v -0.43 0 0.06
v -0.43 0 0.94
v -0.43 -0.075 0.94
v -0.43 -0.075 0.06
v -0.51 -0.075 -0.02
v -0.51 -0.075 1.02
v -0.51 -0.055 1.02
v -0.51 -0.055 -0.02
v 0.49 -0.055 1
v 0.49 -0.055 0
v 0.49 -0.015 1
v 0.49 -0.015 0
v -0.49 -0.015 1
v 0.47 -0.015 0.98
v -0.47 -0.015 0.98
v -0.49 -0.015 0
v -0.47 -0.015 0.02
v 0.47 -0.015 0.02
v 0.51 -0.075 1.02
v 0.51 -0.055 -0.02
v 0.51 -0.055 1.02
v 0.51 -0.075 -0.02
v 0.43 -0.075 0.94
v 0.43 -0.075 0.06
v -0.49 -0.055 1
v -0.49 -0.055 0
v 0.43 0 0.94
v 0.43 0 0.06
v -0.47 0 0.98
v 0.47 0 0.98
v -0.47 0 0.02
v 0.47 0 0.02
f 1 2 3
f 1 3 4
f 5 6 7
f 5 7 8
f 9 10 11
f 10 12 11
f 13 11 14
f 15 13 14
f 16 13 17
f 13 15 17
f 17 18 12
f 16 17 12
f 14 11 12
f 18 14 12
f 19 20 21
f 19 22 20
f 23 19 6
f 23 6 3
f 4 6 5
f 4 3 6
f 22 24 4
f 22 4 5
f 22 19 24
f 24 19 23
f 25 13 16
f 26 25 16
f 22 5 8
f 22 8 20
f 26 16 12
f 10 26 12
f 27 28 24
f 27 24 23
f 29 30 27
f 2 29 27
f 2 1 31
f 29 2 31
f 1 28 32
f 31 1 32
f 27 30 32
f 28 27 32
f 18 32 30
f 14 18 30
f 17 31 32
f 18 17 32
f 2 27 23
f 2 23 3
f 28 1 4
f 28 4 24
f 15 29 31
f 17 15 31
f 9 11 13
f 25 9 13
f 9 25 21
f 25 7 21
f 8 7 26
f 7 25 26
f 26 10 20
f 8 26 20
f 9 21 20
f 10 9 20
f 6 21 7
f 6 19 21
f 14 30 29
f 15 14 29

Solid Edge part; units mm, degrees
sketch "Sketch1" plane through (0, 0, 0) normal (0, -1, 0) x (1, 0, 0)
  line L0 (-0.49, 0) -> (0.49, 0)
  line L1 (0.49, 0) -> (0.49, 1)
  line L2 (0.49, 1) -> (-0.49, 1)
  line L3 (-0.49, 1) -> (-0.49, 0)
  dimension "D1" = 1
  dimension "D2" = 0.98
extrude "Protrusion1" add sketch "Sketch1" along normal blind 0.075
sketch "Sketch2" plane through (0, 0, 0.69) normal (0, 1, 0) x (-1, 0, 0)
  line L0 (-0.43, 0.25) -> (0.43, 0.25)
  line L1 (0.43, 0.25) -> (0.43, -0.63)
  line L2 (0.43, -0.63) -> (-0.43, -0.63)
  line L3 (-0.43, -0.63) -> (-0.43, 0.25)
extrude "Cutout1" cut sketch "Sketch2" against normal up to next
sketch "Sketch3" plane through (0, 0, 0.69) normal (0, 1, 0) x (-1, 0, 0)
  line L0 (-0.47, -0.67) -> (-0.47, 0.29)
  line L1 (-0.47, 0.29) -> (0.47, 0.29)
  line L2 (0.47, 0.29) -> (0.47, -0.67)
  line L3 (0.47, -0.67) -> (-0.47, -0.67)
  line L4 (-0.49, -0.69) -> (-0.49, 0.31)
  line L5 (-0.49, 0.31) -> (0.49, 0.31)
  line L6 (0.49, 0.31) -> (0.49, -0.69)
  line L7 (0.49, -0.69) -> (-0.49, -0.69)
extrude "Ausschnitt_1" cut sketch "Sketch3" against normal blind 0.015
sketch "Sketch4" plane through (0, -0.075, 0.69) normal (0, -1, 0) x (1, 0, 0)
  line L0 (-0.51, 0.33) -> (-0.51, -0.71)
  line L1 (-0.51, -0.71) -> (0.51, -0.71)
  line L2 (0.51, -0.71) -> (0.51, 0.33)
  line L3 (0.51, 0.33) -> (-0.51, 0.33)
  line L4 (0.49, 0.31) -> (-0.49, 0.31)
  line L5 (-0.49, 0.31) -> (-0.49, -0.69)
  line L6 (-0.49, -0.69) -> (0.49, -0.69)
  line L7 (0.49, -0.69) -> (0.49, 0.31)
extrude "Ausprägung_2" add sketch "Sketch4" against normal blind 0.02
